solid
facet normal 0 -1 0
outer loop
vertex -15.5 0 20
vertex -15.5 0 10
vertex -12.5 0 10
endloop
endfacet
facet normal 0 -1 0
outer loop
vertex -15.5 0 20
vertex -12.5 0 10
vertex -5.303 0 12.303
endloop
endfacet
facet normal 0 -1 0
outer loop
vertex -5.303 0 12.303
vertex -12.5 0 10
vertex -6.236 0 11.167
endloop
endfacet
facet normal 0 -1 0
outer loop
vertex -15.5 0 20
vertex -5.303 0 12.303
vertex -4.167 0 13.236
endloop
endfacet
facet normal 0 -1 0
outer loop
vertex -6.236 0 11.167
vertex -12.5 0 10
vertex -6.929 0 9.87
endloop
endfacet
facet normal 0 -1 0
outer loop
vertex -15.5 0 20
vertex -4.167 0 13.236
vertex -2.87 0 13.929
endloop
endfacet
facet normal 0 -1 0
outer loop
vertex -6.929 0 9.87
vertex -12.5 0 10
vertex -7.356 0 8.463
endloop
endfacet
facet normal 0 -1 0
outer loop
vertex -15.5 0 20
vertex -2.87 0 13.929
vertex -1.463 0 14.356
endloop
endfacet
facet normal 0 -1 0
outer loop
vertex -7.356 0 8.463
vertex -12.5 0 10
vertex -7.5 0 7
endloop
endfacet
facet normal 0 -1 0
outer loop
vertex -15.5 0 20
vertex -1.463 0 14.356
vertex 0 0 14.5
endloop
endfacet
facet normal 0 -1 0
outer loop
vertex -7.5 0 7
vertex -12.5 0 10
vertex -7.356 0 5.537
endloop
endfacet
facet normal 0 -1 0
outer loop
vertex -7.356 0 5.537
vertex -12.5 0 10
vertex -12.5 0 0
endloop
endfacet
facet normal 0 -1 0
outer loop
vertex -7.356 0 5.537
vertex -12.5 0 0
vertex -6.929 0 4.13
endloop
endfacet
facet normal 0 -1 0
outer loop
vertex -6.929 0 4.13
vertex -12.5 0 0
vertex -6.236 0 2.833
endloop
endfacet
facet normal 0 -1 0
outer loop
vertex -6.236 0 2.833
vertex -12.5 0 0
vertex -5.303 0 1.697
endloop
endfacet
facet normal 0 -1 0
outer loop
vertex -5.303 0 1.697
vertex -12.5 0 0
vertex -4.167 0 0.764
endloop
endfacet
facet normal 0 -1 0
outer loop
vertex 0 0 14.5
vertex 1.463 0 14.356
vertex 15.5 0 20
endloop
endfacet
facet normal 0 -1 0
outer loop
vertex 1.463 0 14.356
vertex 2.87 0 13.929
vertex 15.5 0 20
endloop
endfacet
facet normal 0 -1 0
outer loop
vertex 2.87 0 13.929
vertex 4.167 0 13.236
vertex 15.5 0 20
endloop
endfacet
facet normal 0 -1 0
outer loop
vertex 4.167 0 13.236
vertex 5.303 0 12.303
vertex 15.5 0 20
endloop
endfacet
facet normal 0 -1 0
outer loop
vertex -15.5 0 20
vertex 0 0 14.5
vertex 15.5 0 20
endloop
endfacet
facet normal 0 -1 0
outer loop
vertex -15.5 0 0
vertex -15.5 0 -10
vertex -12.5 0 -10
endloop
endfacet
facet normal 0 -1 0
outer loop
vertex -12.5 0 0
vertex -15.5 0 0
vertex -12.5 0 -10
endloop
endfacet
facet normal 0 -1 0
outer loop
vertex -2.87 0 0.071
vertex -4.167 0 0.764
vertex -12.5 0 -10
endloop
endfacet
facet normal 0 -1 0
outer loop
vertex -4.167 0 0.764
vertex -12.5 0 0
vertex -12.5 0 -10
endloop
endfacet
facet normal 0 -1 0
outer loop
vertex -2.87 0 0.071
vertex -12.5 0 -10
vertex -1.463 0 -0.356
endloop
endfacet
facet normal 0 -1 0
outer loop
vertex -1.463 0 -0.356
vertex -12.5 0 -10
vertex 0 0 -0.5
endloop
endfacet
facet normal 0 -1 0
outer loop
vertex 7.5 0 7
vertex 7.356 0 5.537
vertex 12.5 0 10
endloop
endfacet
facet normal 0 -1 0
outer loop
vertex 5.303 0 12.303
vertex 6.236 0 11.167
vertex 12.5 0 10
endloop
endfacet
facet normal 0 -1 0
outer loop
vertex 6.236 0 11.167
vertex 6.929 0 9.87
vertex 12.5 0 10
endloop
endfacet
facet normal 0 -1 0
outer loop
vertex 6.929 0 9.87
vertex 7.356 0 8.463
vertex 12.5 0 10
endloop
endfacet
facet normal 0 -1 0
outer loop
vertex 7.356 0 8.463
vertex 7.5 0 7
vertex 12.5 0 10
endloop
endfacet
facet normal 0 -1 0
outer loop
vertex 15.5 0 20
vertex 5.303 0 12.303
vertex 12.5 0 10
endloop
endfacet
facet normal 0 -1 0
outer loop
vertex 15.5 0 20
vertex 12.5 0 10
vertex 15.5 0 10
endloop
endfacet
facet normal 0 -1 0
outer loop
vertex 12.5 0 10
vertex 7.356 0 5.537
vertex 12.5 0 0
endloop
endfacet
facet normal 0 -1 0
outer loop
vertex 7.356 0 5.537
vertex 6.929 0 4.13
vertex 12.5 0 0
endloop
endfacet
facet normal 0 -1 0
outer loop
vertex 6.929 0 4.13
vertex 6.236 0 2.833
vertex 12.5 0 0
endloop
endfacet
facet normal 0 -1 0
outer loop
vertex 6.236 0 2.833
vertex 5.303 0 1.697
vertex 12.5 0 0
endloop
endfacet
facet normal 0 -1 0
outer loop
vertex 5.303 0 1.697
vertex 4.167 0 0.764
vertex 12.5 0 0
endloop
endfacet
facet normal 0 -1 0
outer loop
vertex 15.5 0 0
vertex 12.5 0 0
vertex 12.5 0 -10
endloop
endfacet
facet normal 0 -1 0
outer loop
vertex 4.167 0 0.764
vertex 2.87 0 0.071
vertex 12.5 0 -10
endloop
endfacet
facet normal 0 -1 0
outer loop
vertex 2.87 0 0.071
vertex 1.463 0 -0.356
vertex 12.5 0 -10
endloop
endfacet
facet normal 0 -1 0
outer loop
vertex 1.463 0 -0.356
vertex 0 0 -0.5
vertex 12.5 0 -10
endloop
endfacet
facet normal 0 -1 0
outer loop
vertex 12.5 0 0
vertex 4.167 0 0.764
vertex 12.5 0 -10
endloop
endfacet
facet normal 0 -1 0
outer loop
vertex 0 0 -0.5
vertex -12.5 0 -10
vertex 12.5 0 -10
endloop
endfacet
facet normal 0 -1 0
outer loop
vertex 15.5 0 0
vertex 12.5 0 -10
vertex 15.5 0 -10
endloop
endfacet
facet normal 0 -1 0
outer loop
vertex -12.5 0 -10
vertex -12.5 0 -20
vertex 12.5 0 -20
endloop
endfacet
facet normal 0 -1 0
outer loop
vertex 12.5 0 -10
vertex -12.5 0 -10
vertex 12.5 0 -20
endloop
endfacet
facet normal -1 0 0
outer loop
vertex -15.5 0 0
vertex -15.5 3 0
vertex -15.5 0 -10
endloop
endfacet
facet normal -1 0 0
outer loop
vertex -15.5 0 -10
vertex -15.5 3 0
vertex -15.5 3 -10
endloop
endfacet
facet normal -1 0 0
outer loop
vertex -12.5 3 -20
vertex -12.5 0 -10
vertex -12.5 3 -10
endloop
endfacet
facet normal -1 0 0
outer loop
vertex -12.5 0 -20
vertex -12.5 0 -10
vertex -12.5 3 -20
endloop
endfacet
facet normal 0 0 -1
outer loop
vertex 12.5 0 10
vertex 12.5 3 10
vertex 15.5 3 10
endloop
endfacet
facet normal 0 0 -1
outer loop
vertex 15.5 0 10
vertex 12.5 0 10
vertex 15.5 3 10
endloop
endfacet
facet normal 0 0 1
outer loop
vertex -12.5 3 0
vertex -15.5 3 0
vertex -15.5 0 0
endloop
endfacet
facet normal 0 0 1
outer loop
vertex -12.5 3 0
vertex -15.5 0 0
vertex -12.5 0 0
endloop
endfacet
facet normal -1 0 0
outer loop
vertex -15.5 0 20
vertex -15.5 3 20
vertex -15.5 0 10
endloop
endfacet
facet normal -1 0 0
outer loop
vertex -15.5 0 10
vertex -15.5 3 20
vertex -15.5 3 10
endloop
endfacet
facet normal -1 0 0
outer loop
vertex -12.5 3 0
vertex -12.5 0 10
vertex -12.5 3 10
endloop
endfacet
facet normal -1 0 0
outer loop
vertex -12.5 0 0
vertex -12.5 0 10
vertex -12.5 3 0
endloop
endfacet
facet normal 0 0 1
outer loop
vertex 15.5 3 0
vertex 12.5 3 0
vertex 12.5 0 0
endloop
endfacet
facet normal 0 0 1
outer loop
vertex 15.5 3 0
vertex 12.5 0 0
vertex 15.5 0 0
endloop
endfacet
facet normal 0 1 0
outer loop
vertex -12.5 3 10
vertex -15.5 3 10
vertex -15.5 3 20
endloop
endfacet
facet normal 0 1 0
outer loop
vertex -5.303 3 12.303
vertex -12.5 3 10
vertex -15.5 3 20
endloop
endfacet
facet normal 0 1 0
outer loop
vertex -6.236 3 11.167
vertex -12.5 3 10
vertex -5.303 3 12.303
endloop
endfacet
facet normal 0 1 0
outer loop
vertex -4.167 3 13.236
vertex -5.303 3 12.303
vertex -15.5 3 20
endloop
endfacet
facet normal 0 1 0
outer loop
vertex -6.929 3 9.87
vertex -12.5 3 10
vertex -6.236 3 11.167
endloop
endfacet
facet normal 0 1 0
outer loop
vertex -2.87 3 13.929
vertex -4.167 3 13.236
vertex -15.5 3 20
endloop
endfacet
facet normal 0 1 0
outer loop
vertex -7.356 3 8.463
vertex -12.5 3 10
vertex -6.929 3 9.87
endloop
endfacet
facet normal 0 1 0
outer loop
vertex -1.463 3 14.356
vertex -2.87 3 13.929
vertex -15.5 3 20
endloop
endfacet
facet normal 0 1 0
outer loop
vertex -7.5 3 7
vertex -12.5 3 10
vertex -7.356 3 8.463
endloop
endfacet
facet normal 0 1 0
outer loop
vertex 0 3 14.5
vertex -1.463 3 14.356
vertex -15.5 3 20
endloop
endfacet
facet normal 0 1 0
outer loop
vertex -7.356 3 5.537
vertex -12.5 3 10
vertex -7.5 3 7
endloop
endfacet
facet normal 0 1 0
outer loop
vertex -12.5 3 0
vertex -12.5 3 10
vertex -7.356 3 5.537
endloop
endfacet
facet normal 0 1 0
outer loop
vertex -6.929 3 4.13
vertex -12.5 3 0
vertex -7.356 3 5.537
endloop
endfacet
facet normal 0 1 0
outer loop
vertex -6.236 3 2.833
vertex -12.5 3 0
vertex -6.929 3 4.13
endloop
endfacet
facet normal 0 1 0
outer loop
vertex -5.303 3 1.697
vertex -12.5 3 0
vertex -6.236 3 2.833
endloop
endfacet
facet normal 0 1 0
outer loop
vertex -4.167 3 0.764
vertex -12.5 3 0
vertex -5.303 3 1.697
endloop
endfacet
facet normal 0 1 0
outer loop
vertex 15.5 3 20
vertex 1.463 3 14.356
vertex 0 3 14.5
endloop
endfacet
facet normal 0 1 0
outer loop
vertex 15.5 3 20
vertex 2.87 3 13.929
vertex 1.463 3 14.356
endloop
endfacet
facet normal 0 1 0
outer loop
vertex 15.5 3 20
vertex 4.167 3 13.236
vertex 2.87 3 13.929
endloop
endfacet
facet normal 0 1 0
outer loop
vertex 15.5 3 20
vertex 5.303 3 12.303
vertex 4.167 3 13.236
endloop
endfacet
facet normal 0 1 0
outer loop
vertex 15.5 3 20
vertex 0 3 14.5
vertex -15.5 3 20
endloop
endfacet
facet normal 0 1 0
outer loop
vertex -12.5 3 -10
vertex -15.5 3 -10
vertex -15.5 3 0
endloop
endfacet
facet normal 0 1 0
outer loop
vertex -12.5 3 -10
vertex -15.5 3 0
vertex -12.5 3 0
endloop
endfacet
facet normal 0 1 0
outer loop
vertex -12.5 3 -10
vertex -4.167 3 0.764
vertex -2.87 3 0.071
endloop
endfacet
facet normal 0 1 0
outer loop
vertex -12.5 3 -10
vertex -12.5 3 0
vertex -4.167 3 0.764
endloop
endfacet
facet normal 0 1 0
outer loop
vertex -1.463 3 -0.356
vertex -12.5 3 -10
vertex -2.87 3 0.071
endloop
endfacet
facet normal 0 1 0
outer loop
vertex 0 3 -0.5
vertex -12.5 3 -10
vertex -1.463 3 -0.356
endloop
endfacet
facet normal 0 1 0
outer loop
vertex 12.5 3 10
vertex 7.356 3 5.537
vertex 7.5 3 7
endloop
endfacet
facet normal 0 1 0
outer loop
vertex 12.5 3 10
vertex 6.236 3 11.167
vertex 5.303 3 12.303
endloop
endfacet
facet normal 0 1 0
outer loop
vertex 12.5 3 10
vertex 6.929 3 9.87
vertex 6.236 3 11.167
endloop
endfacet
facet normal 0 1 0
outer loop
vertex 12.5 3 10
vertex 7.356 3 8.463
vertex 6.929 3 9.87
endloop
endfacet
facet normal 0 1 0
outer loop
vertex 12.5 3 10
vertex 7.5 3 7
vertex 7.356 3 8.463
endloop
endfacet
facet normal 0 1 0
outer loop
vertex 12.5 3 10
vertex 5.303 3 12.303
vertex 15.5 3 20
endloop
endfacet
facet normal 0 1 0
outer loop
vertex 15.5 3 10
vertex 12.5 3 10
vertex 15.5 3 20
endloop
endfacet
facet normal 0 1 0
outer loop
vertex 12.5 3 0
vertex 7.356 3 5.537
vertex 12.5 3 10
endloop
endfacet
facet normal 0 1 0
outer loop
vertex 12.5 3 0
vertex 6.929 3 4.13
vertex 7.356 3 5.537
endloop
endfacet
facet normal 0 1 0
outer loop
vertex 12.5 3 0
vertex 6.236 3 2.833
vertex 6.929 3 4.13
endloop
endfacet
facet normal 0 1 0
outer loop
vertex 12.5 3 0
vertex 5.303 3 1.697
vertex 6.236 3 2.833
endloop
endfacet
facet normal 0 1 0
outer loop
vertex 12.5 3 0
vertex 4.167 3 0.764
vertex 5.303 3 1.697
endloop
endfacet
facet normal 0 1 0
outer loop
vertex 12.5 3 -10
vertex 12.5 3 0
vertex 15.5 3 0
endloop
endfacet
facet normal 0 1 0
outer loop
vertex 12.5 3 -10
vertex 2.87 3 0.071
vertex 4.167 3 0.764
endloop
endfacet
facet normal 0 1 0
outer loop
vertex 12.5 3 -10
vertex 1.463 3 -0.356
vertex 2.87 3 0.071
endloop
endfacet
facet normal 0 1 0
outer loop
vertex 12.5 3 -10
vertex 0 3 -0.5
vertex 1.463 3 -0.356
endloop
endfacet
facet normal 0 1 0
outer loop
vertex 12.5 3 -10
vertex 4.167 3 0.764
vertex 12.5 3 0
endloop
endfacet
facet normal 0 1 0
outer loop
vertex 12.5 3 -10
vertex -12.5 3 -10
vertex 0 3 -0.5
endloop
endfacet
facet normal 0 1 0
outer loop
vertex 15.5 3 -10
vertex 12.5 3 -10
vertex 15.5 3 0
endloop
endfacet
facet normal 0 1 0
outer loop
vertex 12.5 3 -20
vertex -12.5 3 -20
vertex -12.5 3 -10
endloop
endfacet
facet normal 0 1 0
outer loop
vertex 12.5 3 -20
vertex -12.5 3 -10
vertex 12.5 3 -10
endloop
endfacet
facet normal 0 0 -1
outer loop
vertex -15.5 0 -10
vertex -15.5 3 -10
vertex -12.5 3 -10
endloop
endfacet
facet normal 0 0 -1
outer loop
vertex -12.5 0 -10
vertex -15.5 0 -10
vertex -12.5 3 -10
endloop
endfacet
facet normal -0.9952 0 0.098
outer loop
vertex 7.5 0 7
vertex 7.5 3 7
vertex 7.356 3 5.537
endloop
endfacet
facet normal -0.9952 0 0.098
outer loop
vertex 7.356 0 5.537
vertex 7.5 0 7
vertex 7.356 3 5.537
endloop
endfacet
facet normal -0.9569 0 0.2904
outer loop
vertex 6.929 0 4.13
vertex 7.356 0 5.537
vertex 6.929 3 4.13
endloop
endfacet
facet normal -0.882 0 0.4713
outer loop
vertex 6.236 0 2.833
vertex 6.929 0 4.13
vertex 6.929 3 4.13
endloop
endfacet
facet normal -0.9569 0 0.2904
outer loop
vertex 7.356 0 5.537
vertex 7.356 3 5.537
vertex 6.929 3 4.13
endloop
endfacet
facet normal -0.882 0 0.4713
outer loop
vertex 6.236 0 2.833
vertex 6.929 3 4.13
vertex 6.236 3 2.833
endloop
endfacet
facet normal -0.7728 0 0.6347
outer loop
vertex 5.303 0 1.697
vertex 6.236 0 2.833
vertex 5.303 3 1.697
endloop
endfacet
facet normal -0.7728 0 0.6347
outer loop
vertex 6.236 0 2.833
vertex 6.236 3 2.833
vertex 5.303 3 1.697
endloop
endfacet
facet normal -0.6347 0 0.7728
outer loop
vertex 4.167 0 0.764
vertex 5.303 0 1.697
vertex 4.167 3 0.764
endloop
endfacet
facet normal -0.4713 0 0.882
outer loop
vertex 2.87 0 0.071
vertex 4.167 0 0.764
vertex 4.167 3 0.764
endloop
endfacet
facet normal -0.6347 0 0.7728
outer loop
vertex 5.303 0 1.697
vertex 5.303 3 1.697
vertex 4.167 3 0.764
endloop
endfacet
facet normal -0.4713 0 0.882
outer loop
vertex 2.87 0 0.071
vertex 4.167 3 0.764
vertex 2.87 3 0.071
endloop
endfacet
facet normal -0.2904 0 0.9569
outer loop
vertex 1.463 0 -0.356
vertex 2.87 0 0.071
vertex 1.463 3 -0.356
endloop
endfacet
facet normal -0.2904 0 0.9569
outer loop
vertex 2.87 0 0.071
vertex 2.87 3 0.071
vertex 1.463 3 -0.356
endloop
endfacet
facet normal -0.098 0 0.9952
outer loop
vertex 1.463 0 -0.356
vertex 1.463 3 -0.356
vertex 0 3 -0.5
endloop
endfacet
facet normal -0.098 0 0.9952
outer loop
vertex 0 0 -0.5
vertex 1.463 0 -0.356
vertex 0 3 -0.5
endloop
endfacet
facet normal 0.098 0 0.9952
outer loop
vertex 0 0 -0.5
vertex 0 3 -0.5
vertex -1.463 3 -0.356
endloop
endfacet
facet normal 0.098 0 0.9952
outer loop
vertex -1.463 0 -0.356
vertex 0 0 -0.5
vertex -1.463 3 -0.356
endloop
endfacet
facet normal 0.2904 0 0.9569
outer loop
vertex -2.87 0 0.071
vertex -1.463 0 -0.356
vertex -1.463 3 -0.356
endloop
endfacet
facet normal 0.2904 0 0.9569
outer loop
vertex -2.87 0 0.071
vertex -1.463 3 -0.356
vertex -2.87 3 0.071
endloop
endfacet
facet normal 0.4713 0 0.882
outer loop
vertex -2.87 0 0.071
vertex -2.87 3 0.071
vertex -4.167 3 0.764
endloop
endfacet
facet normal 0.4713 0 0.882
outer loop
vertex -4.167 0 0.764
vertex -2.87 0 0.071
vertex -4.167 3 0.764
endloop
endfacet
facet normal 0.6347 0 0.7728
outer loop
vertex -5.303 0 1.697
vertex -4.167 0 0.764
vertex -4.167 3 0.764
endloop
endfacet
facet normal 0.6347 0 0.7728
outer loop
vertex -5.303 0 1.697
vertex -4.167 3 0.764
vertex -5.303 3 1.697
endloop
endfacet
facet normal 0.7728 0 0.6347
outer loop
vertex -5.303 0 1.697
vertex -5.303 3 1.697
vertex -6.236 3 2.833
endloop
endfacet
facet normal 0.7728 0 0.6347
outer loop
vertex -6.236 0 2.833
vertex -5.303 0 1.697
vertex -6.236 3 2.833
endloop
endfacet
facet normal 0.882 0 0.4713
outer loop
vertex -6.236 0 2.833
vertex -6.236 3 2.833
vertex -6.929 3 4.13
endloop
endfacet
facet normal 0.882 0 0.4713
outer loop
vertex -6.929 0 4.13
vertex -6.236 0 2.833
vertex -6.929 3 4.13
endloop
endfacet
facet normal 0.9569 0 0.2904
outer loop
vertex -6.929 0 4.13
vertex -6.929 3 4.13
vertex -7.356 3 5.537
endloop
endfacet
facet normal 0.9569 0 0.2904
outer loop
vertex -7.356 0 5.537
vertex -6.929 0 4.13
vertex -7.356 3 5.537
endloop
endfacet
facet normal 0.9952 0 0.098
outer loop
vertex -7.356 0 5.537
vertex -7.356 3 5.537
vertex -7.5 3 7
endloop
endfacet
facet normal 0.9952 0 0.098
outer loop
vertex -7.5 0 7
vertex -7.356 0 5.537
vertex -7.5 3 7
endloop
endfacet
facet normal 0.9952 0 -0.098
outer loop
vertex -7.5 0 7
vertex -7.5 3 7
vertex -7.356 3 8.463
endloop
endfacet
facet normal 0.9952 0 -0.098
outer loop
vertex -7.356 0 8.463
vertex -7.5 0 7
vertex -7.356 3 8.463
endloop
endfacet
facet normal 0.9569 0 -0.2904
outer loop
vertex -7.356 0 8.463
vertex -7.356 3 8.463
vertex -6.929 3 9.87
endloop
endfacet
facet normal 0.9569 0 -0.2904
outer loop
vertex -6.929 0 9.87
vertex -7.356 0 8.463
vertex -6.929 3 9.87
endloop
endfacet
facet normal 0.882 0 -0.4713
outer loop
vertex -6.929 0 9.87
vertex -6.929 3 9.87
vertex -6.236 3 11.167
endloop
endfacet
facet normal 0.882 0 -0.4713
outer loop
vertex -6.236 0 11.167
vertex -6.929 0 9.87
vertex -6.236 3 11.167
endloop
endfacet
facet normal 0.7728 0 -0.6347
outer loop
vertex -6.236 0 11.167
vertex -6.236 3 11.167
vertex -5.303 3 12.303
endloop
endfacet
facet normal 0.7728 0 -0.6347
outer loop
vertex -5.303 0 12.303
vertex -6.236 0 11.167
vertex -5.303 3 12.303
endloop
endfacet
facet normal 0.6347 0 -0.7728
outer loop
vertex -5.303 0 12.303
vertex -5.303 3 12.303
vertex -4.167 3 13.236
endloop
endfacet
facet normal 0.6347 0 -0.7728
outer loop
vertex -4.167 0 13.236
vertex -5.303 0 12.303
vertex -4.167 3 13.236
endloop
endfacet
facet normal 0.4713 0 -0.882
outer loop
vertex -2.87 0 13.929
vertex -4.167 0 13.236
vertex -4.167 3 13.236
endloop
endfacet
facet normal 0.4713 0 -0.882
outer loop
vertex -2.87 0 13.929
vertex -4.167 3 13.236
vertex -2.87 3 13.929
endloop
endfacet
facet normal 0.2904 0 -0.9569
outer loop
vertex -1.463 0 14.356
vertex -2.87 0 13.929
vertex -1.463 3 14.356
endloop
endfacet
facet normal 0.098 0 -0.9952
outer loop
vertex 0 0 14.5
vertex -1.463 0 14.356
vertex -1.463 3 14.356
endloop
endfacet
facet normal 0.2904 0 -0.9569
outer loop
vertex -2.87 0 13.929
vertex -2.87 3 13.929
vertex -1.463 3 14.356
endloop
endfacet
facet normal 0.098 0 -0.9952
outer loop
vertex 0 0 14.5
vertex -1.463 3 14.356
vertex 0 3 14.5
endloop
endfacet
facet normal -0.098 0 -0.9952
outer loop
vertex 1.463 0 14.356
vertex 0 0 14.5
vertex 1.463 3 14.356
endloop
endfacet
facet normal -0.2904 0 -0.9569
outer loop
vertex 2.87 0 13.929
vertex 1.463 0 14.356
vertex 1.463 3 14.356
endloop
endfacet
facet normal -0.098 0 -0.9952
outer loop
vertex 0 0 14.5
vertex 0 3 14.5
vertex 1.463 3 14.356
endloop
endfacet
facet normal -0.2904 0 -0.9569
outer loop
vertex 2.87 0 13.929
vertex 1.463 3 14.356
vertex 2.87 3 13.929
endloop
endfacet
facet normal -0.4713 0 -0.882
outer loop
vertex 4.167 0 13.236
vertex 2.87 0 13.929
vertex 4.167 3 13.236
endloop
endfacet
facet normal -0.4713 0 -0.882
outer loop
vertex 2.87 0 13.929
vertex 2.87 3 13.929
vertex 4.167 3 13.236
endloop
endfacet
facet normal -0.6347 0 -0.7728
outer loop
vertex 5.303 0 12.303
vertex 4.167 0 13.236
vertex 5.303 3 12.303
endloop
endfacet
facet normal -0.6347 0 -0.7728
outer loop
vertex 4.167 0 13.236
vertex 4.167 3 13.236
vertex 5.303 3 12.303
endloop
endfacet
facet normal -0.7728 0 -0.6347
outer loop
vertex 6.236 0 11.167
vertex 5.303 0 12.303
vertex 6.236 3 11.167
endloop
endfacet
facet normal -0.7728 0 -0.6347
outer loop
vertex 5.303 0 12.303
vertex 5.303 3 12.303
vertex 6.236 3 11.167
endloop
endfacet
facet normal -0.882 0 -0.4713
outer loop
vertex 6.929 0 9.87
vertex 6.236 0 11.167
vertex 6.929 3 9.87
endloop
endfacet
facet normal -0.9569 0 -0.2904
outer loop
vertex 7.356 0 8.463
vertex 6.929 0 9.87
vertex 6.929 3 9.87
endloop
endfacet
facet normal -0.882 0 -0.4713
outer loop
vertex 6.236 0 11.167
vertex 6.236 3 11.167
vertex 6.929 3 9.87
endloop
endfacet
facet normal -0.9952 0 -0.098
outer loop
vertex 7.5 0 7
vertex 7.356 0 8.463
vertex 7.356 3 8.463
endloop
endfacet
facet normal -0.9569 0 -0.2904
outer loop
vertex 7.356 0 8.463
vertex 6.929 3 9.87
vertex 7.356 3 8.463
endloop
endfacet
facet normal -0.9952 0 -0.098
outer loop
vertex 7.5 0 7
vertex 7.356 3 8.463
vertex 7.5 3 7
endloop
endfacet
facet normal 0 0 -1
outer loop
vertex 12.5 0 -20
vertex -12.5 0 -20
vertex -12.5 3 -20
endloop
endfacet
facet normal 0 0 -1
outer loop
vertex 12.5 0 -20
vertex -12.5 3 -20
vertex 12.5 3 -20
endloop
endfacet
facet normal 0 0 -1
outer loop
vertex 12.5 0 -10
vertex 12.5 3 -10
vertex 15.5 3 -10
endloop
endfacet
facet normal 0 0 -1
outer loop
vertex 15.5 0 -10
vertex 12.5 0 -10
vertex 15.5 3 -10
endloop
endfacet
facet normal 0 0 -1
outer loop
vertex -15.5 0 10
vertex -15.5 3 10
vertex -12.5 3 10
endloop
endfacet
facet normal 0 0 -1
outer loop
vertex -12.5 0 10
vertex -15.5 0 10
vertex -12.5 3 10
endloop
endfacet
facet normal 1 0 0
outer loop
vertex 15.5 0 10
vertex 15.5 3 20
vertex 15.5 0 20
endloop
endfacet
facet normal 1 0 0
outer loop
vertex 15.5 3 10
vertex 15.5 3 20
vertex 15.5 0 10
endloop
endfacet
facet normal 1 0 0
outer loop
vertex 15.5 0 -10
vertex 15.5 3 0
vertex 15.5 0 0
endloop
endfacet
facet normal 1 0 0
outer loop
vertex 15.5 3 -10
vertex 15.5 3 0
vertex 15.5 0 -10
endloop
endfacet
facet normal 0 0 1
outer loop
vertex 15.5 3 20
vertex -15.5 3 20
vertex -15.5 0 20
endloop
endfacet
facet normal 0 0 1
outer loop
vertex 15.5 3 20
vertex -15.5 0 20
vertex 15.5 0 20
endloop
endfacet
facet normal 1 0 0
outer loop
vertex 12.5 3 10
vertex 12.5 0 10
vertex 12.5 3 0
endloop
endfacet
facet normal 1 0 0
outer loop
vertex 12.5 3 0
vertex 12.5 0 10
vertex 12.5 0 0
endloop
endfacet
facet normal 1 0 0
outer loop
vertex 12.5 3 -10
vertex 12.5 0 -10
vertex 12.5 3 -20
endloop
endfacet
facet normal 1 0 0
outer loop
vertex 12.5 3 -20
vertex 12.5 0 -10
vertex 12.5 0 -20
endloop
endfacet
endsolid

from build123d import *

# Parameters (mm, degrees)
SKETCH1_W           = 25
SKETCH1_H           = 40
BOSS_EXTRUDE1_DEPTH = 3
SKETCH2_W           = 3
SKETCH2_H           = 10
BOSS_EXTRUDE2_DEPTH = 3
SKETCH3_R           = 7.5
CUT_EXTRUDE1_DEPTH  = 4


with BuildPart() as part:
    # Sketch1 → Boss-Extrude1 (new body)
    with BuildSketch(Plane(origin=(0, 0, 0), x_dir=(1, 0, 0), z_dir=(0, 1, 0))):
        Rectangle(SKETCH1_W, SKETCH1_H)
    extrude(amount=BOSS_EXTRUDE1_DEPTH)

    # Sketch2 → Boss-Extrude2 (add)
    with BuildSketch(Plane(origin=(0, 3, 0), x_dir=(1, 0, 0), z_dir=(0, 1, 0))):
        with Locations((14, -15)):
            Rectangle(SKETCH2_W, SKETCH2_H)
        with Locations((14, 5)):
            Rectangle(SKETCH2_W, SKETCH2_H)
        with Locations((-14, -15)):
            Rectangle(SKETCH2_W, SKETCH2_H)
        with Locations((-14, 5)):
            Rectangle(SKETCH2_W, SKETCH2_H)
    extrude(amount=-BOSS_EXTRUDE2_DEPTH)

    # Sketch3 → Cut-Extrude1 (cut, through all)
    with BuildSketch(Plane(origin=(0, 3, 0), x_dir=(1, 0, 0), z_dir=(0, 1, 0))):
        with Locations((0, -7)):
            Circle(SKETCH3_R)
    extrude(amount=-CUT_EXTRUDE1_DEPTH, mode=Mode.SUBTRACT)


solid = part.part
